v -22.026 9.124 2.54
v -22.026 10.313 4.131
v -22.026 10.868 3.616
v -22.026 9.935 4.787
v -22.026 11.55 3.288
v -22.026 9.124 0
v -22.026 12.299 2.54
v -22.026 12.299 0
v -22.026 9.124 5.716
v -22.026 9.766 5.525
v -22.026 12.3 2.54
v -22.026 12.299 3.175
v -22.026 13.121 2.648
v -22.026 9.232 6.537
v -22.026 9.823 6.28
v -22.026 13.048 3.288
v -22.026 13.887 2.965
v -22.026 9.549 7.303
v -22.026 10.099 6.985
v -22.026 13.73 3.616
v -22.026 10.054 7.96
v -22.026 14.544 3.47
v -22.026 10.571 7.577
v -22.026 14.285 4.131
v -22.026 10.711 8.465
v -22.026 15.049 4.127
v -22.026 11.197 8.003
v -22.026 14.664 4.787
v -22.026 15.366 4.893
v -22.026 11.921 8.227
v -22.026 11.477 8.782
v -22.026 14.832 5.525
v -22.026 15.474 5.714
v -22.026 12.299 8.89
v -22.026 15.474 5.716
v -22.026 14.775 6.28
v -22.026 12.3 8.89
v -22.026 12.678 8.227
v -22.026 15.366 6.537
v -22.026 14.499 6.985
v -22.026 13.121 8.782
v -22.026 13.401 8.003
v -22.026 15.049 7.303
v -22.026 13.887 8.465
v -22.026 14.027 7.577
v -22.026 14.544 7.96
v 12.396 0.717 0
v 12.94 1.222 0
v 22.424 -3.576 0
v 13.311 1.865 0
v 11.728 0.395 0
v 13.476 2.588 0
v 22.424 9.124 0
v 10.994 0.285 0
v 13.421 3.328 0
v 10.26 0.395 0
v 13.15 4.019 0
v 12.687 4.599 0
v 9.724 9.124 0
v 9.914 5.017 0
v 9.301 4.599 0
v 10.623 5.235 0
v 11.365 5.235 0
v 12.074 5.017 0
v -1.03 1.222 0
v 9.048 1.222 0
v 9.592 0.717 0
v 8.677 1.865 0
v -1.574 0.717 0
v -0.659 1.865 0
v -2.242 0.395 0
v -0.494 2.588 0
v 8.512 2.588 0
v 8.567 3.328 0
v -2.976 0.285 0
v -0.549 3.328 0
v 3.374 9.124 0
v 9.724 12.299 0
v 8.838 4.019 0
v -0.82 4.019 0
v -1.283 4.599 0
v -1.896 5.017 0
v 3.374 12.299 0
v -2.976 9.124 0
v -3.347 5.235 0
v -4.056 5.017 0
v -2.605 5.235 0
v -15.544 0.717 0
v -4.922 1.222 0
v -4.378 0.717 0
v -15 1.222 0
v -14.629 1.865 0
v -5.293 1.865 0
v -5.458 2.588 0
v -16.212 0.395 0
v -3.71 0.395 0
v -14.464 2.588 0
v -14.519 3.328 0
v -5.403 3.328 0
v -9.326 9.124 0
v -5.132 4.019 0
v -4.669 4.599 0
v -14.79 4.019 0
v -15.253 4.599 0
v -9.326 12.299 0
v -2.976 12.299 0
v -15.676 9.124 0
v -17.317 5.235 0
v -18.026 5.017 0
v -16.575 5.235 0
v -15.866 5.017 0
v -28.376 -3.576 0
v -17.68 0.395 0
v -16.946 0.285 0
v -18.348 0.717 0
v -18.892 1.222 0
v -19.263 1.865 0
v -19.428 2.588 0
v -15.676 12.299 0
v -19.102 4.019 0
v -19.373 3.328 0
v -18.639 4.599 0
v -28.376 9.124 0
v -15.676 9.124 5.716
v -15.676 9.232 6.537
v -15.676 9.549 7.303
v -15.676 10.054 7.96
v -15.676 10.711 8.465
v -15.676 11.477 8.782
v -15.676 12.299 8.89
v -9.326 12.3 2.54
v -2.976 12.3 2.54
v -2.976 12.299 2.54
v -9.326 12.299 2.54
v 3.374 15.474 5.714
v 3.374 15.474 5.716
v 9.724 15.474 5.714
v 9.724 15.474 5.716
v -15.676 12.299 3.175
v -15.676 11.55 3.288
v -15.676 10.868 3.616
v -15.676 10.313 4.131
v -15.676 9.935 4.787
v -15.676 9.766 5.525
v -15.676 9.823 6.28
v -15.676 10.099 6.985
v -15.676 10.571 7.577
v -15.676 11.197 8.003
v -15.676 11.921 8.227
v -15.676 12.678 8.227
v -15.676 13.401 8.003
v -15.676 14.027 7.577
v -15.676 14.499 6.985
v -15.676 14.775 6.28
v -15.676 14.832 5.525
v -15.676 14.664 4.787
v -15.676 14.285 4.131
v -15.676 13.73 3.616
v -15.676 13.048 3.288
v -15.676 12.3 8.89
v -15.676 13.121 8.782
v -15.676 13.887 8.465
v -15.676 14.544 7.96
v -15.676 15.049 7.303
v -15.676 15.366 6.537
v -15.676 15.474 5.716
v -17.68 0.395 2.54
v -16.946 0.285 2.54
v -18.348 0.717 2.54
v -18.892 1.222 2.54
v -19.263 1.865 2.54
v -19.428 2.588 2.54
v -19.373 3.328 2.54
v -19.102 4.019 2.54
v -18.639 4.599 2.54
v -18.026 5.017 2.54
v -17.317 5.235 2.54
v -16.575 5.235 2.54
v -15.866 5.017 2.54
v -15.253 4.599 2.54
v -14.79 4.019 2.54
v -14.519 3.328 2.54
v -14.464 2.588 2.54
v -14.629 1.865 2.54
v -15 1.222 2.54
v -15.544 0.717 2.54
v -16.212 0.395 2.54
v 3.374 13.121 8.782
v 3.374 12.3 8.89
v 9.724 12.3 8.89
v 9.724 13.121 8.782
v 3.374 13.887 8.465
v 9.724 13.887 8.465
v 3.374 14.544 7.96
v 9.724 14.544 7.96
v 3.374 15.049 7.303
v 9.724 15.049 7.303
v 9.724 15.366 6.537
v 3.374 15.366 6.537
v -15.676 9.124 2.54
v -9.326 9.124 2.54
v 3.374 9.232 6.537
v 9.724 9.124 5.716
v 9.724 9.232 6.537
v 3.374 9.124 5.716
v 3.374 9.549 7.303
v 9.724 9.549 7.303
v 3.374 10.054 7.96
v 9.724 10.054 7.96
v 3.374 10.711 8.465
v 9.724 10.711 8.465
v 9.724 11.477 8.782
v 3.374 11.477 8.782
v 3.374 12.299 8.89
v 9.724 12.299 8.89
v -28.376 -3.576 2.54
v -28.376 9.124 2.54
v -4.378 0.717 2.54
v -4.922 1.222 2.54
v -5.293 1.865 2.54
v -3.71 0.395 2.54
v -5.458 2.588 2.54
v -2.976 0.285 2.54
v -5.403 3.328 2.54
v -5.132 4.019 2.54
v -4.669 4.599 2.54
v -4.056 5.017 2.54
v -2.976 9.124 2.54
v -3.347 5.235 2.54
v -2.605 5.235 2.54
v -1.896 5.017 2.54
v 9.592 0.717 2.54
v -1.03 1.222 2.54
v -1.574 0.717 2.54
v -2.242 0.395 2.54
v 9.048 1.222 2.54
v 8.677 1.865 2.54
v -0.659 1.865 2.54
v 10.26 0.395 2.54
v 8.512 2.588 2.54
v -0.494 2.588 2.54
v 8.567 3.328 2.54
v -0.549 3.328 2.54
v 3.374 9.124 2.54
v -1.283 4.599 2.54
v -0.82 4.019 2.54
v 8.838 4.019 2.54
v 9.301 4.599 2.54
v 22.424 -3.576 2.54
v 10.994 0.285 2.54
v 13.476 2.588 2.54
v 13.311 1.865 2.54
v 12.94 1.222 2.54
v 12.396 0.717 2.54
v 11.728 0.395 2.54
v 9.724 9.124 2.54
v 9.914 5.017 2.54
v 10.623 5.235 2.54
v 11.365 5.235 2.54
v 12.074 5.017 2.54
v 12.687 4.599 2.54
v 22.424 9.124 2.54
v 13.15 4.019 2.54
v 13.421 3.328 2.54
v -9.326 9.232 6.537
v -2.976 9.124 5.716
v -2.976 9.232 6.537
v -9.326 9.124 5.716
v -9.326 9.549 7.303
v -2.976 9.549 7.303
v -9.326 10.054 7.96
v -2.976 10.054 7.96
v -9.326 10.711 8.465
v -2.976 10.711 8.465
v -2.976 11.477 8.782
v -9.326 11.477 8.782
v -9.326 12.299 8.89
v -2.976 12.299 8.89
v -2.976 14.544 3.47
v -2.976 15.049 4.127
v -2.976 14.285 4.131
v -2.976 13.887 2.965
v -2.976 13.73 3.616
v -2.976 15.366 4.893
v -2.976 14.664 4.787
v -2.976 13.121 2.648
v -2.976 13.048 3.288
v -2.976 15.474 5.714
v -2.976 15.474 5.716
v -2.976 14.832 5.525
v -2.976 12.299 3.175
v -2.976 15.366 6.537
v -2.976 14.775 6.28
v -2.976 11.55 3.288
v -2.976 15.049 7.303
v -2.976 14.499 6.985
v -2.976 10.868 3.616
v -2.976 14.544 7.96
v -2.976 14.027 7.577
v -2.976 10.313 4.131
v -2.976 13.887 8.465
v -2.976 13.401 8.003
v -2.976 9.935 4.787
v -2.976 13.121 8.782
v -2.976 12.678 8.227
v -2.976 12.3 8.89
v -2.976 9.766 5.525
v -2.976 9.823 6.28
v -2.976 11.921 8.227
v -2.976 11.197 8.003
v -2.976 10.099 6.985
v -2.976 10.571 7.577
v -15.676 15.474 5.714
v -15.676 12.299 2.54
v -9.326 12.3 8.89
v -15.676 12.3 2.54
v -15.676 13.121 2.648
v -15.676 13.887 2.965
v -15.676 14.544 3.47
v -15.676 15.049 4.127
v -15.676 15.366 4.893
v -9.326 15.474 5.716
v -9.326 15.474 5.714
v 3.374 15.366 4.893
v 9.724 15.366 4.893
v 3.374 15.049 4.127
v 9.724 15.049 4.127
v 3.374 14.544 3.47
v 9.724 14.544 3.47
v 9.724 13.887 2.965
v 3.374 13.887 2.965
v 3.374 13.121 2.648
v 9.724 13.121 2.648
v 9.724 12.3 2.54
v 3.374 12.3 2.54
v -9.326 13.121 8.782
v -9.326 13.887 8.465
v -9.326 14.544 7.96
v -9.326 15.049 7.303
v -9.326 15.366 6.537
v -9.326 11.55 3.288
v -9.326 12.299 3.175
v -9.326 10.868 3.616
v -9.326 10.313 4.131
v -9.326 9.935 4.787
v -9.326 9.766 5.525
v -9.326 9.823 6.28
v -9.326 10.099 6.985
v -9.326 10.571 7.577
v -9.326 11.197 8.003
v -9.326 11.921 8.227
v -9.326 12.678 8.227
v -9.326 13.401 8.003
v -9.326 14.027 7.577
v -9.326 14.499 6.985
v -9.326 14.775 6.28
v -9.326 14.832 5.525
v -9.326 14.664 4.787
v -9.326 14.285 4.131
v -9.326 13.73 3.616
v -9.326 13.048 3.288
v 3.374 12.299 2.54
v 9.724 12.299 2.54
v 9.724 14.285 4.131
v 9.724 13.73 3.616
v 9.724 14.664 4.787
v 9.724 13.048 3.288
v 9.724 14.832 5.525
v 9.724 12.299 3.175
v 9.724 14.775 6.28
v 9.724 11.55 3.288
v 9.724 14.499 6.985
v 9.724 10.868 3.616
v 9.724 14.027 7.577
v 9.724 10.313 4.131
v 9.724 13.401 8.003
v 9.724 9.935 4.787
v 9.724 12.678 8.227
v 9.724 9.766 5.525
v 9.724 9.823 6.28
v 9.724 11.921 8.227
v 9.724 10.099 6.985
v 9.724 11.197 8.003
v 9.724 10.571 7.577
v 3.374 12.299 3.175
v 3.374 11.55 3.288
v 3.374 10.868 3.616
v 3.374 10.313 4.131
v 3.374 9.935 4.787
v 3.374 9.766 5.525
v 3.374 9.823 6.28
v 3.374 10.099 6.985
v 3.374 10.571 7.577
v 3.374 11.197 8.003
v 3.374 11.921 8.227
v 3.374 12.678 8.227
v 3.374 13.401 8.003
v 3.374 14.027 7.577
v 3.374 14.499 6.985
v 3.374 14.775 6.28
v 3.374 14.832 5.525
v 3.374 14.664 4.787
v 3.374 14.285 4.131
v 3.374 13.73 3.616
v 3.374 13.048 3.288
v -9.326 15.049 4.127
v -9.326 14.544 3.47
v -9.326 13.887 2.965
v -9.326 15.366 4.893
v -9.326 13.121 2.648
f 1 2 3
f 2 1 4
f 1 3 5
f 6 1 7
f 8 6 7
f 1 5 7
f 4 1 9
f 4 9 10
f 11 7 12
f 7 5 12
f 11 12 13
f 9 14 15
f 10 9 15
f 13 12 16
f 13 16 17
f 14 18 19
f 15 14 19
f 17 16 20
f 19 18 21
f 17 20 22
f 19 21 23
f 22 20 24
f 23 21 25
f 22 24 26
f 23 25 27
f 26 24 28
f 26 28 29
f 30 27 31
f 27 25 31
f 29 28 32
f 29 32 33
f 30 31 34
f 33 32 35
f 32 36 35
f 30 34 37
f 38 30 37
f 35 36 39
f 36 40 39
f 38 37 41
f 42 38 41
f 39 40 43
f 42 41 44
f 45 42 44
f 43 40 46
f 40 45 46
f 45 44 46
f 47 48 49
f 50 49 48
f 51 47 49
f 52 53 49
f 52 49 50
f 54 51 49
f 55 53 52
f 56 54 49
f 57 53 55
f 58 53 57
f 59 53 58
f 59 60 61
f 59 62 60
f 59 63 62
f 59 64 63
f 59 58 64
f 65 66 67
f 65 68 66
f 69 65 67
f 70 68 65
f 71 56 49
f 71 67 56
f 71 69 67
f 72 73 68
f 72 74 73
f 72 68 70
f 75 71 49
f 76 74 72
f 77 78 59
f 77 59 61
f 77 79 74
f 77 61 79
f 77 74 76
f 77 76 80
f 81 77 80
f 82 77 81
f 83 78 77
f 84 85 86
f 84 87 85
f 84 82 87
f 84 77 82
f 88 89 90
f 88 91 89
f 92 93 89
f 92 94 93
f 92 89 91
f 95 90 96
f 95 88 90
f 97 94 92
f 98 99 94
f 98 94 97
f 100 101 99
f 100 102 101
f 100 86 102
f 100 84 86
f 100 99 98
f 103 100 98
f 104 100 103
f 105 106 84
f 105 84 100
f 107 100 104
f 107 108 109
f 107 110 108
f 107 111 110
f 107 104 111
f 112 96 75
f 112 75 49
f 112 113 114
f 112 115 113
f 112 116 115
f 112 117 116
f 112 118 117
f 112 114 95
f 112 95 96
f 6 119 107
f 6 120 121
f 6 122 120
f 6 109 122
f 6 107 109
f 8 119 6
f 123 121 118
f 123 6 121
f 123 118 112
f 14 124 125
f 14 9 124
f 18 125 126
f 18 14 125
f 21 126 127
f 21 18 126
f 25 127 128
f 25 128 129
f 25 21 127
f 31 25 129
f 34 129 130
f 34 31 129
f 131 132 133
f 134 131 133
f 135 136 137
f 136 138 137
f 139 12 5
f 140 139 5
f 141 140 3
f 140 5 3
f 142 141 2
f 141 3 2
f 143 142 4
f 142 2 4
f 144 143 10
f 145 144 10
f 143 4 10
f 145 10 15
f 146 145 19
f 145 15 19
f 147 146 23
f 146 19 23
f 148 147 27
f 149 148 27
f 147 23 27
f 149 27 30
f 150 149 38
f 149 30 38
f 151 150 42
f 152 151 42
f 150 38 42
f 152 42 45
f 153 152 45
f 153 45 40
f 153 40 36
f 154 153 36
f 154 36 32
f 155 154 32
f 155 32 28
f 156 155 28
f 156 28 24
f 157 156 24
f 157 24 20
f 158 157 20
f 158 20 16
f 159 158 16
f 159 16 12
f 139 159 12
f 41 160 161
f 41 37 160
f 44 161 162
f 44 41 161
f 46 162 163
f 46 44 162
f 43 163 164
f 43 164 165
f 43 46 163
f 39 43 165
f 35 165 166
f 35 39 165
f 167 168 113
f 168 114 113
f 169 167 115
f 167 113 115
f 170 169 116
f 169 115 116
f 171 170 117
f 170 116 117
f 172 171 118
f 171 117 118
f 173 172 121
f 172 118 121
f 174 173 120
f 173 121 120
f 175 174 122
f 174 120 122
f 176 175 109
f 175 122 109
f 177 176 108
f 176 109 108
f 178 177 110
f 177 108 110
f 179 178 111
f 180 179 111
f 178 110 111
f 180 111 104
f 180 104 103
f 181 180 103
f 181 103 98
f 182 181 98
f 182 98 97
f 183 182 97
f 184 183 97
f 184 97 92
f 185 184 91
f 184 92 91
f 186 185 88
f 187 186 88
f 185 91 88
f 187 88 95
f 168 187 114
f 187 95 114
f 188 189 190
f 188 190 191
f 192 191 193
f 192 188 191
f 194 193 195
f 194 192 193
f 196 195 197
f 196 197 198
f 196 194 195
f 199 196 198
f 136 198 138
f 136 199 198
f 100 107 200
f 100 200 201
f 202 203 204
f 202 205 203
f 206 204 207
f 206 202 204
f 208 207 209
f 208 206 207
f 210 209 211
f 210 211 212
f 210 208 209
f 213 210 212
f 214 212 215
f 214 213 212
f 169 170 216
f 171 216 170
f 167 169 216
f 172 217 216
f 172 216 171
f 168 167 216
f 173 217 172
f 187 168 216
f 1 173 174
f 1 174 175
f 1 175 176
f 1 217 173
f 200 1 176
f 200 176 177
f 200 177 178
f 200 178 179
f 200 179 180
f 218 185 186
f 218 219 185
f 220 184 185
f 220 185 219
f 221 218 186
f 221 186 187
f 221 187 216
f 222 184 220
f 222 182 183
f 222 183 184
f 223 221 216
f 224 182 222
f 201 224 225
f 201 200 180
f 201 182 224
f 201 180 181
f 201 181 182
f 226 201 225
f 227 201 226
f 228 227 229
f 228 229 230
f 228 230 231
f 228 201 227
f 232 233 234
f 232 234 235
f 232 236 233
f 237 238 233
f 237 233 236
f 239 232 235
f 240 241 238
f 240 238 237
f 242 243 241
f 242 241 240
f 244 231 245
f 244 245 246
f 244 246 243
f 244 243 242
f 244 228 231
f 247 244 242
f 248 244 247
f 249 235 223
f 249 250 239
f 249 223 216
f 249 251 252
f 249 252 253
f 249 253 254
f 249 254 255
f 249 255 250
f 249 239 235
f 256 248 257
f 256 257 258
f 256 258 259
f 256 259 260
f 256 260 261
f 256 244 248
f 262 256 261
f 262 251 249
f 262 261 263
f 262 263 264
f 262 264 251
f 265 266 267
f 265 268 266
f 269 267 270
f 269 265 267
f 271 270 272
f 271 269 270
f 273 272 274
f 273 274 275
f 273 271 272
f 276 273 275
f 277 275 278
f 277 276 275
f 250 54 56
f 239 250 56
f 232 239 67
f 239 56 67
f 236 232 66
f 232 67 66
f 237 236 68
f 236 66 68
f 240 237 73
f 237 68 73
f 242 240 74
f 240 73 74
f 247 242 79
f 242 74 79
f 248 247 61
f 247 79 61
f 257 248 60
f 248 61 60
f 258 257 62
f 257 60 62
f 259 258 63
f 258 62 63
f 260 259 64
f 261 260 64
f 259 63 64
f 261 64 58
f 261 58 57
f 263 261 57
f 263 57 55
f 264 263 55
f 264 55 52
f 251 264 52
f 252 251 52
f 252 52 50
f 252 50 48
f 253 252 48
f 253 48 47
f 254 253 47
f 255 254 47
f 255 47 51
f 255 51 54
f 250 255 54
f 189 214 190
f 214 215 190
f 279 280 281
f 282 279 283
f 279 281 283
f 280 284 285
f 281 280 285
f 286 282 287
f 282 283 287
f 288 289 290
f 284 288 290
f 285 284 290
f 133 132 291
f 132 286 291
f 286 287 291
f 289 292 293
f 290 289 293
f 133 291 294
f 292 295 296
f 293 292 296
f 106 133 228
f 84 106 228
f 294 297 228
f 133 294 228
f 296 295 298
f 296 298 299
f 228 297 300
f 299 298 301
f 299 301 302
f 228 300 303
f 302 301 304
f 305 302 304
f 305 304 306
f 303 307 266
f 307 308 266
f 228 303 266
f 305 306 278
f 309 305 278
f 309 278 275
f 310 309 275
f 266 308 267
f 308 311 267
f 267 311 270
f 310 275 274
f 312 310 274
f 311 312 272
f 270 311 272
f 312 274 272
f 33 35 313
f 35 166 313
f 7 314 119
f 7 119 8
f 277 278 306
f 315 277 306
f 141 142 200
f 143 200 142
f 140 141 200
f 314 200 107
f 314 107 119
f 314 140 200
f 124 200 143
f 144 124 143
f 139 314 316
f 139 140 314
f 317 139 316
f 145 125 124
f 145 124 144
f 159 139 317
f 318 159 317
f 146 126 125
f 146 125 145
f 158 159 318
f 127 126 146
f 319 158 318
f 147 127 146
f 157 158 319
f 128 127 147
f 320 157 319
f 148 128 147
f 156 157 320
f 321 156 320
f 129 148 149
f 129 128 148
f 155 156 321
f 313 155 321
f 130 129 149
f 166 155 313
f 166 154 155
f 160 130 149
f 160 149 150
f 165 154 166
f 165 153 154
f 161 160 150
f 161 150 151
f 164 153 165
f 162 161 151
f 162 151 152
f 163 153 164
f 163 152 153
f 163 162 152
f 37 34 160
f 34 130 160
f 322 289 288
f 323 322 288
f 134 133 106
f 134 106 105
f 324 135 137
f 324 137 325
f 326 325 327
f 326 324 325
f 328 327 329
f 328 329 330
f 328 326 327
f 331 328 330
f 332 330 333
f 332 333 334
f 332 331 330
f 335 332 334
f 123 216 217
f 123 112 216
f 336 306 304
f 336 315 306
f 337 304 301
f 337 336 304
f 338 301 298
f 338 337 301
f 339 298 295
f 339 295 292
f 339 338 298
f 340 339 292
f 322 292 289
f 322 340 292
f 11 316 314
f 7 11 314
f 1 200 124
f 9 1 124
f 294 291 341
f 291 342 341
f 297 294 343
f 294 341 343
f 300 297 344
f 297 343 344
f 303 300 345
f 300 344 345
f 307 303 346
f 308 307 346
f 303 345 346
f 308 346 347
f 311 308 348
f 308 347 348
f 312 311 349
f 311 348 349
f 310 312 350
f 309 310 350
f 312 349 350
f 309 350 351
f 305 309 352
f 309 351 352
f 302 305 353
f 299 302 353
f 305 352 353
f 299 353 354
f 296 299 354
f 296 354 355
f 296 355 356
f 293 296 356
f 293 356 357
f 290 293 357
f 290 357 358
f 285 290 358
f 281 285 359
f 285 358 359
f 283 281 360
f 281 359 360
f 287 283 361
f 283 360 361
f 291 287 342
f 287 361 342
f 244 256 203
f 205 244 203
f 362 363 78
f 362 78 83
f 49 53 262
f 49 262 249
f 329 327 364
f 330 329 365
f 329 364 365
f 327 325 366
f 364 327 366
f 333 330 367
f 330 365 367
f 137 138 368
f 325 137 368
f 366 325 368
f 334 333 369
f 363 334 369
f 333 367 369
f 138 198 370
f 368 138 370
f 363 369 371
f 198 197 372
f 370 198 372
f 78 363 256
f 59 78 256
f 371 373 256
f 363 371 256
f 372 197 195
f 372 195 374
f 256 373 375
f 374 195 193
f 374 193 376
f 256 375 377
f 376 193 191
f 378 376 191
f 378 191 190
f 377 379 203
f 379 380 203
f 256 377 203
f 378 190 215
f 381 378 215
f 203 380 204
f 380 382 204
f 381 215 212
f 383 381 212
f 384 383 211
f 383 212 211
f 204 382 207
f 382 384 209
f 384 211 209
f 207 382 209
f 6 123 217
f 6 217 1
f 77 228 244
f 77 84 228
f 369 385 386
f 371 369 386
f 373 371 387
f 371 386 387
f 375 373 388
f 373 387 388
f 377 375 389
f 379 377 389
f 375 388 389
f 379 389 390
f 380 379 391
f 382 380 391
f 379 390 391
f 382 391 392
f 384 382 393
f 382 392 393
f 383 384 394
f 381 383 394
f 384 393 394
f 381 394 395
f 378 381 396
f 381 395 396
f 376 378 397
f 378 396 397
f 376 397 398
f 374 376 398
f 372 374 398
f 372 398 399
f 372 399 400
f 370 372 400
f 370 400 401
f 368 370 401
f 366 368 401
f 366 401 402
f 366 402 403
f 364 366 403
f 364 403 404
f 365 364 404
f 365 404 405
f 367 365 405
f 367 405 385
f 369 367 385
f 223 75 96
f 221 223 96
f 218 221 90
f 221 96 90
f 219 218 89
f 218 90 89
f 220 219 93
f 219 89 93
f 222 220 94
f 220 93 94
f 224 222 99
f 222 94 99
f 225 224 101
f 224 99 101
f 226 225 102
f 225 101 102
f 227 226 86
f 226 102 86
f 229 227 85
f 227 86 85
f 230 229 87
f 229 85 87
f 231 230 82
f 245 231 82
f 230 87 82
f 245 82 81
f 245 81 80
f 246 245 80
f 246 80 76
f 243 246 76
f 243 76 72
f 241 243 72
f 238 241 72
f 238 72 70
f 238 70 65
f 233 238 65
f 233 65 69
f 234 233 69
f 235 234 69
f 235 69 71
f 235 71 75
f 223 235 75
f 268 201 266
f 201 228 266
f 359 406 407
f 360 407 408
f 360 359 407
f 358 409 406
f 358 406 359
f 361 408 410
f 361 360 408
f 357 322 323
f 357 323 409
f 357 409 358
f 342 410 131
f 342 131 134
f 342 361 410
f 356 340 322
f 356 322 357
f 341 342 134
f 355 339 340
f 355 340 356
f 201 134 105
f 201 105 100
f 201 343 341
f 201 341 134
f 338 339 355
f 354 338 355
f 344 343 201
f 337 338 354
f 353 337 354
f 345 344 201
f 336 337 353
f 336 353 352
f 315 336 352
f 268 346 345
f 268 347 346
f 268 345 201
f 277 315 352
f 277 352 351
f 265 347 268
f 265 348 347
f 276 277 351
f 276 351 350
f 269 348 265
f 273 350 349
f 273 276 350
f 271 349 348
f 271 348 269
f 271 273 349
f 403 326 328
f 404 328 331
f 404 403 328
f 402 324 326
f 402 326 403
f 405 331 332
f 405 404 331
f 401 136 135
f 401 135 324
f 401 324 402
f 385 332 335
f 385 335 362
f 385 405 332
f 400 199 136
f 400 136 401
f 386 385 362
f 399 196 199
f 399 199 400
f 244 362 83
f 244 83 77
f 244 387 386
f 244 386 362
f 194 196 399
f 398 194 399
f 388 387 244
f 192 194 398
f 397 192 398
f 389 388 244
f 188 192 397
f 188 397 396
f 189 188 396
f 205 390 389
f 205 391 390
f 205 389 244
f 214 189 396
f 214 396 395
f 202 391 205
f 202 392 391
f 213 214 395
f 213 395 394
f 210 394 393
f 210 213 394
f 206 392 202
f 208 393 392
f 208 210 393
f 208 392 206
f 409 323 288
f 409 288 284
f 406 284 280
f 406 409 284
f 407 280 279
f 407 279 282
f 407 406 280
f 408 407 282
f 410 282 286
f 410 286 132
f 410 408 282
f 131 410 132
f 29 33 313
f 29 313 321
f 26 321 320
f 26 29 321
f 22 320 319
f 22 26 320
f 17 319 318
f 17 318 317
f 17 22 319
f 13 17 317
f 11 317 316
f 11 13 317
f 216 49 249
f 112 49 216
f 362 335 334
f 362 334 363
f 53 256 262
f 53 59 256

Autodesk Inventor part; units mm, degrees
ref_plane "YZ Plane" through (0, 0, 0) normal (1, 0, 0) x (0, 1, 0)
ref_plane "XZ Plane" through (0, 0, 0) normal (0, 1, 0) x (-1, 0, 0)
sketch "Sketch1" plane through (0, 0, 0) normal (0, 0, 1) x (1, 0, 0)
  line L0 (-28.3759, 9.1241) -> (22.4241, 9.1241)
  line L1 (22.4241, 9.1241) -> (22.4241, -3.5759)
  line L2 (22.4241, -3.5759) -> (-28.3759, -3.5759)
  line L3 (-28.3759, -3.5759) -> (-28.3759, 9.1241)
  point P0 (0, 0)
  dimension "d0" = 50.8
  dimension "d1" = 12.7
extrude "Extrusion1" add sketch "Sketch1" along normal blind 2.54
sketch "Sketch2" plane through (22.4241, -3.5759, 0) normal (1, 0, 0) x (0, 0, -1)
  line L0 (0, 12.7) -> (6.35, 12.7)
  line L1 (6.35, 12.7) -> (6.35, 19.05)
  line L2 (6.35, 19.05) -> (0, 19.05)
  line L3 (0, 19.05) -> (0, 12.7)
  line L4 (0, 0) -> (-2.54, 0) projected
  line L5 (0, 12.7) -> (-2.54, 12.7) projected
  line L6 (-1.27, 12.7) -> (-1.27, 0)
  line L7 (-2.54, 12.7) -> (-8.89, 12.7)
  line L8 (-8.89, 12.7) -> (-8.89, 19.05)
  line L9 (-8.89, 19.05) -> (-2.54, 19.05)
  line L10 (-2.54, 19.05) -> (-2.54, 12.7)
  point P0 (0, 3.5759)
  dimension "d4" = 6.35
  dimension "d5" = 6.35
ref_plane "Work Plane2" through (-28.3759, 9.1241, 0) normal (0, 0, 1) x (1, 0, 0)
sketch "Sketch3" plane through (-28.3759, 9.1241, 0) normal (0, 0, 1) x (1, 0, 0)
  line L0 (38.1, 0) -> (31.75, 0)
  line L1 (31.75, 0) -> (31.75, 7.3179)
  line L2 (31.75, 7.3179) -> (38.1, 7.3179)
  line L3 (38.1, 7.3179) -> (38.1, 0)
  line L4 (25.4, 0) -> (19.05, 0)
  line L5 (19.05, 0) -> (19.05, 7.3179)
  line L6 (19.05, 7.3179) -> (25.4, 7.3179)
  line L7 (25.4, 7.3179) -> (25.4, 0)
  line L8 (12.7, 0) -> (6.35, 0)
  line L9 (6.35, 0) -> (6.35, 7.3179)
  line L10 (6.35, 7.3179) -> (12.7, 7.3179)
  line L11 (12.7, 7.3179) -> (12.7, 0)
  line L12 (38.1, 7.3179) -> (50.8, 7.3179)
  line L13 (38.1, 0) -> (38.1, 7.3179)
  line L14 (25.4, 7.3179) -> (31.75, 7.3179)
  line L15 (31.75, 7.3179) -> (31.75, 0)
  line L16 (31.75, 0) -> (25.4, 0)
  line L17 (25.4, 0) -> (25.4, 7.3179)
  line L18 (12.7, 7.3179) -> (19.05, 7.3179)
  line L19 (19.05, 7.3179) -> (19.05, 0)
  line L20 (19.05, 0) -> (12.7, 0)
  line L21 (12.7, 0) -> (12.7, 7.3179)
  line L22 (6.35, 0) -> (0, 0)
  line L23 (0, 0) -> (0, 7.3179)
  line L24 (0, 7.3179) -> (6.35, 7.3179)
  line L25 (6.35, 7.3179) -> (6.35, 0)
  line L26 (50.8, 7.3179) -> (50.8, 0)
  line L27 (50.8, 0) -> (38.1, 0)
  point P0 (28.3759, -9.1241)
extrude "Extrusion4" add sketch "Sketch2" against normal blind 50.8 contours L7 L8 L9 L10
fillet "Fillet2" radius 3.175 3 edges at (-2.9759, 15.4741, 8.89) (-2.9759, 15.4741, 2.54) (-2.9759, 9.1241, 8.89)
extrude "Extrusion5" cut sketch "Sketch3" along normal blind 50.8 contours L3 L12 L26 L27 | L16 L7 L14 L1 | L20 L11 L18 L5 | L22 L23 L24 L9
hole "Hole3" at (9.7241, 12.2991, 5.715) direction (-1, 0, 0) diameter 5.08 end through all
hole "Hole4" at (-16.9459, 2.7741, 2.54) direction (0, 0, -1) diameter 4.9784 end through all thread size "1/4-20 UNC" class "2B" standard "ANSI Unified Screw Threads"
hole "Hole5" at (10.9941, 2.7741, 2.54) direction (0, 0, -1) diameter 4.9784 end through all thread size "1/4-20 UNC" class "2B" standard "ANSI Unified Screw Threads"
hole "Hole6" at (-2.9759, 2.7741, 2.54) direction (0, 0, -1) diameter 4.9784 end through all thread size "1/4-20 UNC" class "2B" standard "ANSI Unified Screw Threads"
sketch "Sketch4" plane through (9.7241, 9.1241, 2.54) normal (0, 0, -1) x (-1, 0, 0)
  line L0 (0, 3.175) -> (0, 0) projected
  line L1 (6.35, 0) -> (0, 0) projected
  line L2 (0, 3.175) -> (6.35, 3.175)
  line L3 (6.35, 3.175) -> (6.35, 0)
  line L4 (6.35, 0) -> (0, 0)
  line L5 (0, 0) -> (0, 3.175)
  point P0 (9.7241, -9.1241)
sketch "Sketch5" plane through (-2.9759, 9.1241, 2.54) normal (0, 0, -1) x (-1, 0, 0)
  line L0 (0, 3.175) -> (0, 0) projected
  line L1 (6.35, 0) -> (0, 0) projected
  line L2 (0, 3.175) -> (6.35, 3.175)
  line L3 (6.35, 3.175) -> (6.35, 0)
  line L4 (6.35, 0) -> (0, 0)
  line L5 (0, 0) -> (0, 3.175)
  point P0 (-2.9759, -9.1241)
sketch "Sketch6" plane through (-15.6759, 12.2991, 2.54) normal (0, 0, -1) x (-1, 0, 0)
  line L0 (6.35, -3.175) -> (6.35, 0) projected
  line L1 (0, 0) -> (6.35, 0) projected
  line L2 (0, 0) -> (6.35, 0)
  line L3 (6.35, 0) -> (6.35, -3.175)
  line L4 (6.35, -3.175) -> (0, -3.175)
  line L5 (0, -3.175) -> (0, 0)
  point P0 (-15.6759, -12.2991)
extrude "Extrusion6" add sketch "Sketch4" along normal blind 2.54
extrude "Extrusion7" add sketch "Sketch5" along normal blind 2.54
extrude "Extrusion8" add sketch "Sketch6" along normal blind 2.54
properties part number "HingeP2"
